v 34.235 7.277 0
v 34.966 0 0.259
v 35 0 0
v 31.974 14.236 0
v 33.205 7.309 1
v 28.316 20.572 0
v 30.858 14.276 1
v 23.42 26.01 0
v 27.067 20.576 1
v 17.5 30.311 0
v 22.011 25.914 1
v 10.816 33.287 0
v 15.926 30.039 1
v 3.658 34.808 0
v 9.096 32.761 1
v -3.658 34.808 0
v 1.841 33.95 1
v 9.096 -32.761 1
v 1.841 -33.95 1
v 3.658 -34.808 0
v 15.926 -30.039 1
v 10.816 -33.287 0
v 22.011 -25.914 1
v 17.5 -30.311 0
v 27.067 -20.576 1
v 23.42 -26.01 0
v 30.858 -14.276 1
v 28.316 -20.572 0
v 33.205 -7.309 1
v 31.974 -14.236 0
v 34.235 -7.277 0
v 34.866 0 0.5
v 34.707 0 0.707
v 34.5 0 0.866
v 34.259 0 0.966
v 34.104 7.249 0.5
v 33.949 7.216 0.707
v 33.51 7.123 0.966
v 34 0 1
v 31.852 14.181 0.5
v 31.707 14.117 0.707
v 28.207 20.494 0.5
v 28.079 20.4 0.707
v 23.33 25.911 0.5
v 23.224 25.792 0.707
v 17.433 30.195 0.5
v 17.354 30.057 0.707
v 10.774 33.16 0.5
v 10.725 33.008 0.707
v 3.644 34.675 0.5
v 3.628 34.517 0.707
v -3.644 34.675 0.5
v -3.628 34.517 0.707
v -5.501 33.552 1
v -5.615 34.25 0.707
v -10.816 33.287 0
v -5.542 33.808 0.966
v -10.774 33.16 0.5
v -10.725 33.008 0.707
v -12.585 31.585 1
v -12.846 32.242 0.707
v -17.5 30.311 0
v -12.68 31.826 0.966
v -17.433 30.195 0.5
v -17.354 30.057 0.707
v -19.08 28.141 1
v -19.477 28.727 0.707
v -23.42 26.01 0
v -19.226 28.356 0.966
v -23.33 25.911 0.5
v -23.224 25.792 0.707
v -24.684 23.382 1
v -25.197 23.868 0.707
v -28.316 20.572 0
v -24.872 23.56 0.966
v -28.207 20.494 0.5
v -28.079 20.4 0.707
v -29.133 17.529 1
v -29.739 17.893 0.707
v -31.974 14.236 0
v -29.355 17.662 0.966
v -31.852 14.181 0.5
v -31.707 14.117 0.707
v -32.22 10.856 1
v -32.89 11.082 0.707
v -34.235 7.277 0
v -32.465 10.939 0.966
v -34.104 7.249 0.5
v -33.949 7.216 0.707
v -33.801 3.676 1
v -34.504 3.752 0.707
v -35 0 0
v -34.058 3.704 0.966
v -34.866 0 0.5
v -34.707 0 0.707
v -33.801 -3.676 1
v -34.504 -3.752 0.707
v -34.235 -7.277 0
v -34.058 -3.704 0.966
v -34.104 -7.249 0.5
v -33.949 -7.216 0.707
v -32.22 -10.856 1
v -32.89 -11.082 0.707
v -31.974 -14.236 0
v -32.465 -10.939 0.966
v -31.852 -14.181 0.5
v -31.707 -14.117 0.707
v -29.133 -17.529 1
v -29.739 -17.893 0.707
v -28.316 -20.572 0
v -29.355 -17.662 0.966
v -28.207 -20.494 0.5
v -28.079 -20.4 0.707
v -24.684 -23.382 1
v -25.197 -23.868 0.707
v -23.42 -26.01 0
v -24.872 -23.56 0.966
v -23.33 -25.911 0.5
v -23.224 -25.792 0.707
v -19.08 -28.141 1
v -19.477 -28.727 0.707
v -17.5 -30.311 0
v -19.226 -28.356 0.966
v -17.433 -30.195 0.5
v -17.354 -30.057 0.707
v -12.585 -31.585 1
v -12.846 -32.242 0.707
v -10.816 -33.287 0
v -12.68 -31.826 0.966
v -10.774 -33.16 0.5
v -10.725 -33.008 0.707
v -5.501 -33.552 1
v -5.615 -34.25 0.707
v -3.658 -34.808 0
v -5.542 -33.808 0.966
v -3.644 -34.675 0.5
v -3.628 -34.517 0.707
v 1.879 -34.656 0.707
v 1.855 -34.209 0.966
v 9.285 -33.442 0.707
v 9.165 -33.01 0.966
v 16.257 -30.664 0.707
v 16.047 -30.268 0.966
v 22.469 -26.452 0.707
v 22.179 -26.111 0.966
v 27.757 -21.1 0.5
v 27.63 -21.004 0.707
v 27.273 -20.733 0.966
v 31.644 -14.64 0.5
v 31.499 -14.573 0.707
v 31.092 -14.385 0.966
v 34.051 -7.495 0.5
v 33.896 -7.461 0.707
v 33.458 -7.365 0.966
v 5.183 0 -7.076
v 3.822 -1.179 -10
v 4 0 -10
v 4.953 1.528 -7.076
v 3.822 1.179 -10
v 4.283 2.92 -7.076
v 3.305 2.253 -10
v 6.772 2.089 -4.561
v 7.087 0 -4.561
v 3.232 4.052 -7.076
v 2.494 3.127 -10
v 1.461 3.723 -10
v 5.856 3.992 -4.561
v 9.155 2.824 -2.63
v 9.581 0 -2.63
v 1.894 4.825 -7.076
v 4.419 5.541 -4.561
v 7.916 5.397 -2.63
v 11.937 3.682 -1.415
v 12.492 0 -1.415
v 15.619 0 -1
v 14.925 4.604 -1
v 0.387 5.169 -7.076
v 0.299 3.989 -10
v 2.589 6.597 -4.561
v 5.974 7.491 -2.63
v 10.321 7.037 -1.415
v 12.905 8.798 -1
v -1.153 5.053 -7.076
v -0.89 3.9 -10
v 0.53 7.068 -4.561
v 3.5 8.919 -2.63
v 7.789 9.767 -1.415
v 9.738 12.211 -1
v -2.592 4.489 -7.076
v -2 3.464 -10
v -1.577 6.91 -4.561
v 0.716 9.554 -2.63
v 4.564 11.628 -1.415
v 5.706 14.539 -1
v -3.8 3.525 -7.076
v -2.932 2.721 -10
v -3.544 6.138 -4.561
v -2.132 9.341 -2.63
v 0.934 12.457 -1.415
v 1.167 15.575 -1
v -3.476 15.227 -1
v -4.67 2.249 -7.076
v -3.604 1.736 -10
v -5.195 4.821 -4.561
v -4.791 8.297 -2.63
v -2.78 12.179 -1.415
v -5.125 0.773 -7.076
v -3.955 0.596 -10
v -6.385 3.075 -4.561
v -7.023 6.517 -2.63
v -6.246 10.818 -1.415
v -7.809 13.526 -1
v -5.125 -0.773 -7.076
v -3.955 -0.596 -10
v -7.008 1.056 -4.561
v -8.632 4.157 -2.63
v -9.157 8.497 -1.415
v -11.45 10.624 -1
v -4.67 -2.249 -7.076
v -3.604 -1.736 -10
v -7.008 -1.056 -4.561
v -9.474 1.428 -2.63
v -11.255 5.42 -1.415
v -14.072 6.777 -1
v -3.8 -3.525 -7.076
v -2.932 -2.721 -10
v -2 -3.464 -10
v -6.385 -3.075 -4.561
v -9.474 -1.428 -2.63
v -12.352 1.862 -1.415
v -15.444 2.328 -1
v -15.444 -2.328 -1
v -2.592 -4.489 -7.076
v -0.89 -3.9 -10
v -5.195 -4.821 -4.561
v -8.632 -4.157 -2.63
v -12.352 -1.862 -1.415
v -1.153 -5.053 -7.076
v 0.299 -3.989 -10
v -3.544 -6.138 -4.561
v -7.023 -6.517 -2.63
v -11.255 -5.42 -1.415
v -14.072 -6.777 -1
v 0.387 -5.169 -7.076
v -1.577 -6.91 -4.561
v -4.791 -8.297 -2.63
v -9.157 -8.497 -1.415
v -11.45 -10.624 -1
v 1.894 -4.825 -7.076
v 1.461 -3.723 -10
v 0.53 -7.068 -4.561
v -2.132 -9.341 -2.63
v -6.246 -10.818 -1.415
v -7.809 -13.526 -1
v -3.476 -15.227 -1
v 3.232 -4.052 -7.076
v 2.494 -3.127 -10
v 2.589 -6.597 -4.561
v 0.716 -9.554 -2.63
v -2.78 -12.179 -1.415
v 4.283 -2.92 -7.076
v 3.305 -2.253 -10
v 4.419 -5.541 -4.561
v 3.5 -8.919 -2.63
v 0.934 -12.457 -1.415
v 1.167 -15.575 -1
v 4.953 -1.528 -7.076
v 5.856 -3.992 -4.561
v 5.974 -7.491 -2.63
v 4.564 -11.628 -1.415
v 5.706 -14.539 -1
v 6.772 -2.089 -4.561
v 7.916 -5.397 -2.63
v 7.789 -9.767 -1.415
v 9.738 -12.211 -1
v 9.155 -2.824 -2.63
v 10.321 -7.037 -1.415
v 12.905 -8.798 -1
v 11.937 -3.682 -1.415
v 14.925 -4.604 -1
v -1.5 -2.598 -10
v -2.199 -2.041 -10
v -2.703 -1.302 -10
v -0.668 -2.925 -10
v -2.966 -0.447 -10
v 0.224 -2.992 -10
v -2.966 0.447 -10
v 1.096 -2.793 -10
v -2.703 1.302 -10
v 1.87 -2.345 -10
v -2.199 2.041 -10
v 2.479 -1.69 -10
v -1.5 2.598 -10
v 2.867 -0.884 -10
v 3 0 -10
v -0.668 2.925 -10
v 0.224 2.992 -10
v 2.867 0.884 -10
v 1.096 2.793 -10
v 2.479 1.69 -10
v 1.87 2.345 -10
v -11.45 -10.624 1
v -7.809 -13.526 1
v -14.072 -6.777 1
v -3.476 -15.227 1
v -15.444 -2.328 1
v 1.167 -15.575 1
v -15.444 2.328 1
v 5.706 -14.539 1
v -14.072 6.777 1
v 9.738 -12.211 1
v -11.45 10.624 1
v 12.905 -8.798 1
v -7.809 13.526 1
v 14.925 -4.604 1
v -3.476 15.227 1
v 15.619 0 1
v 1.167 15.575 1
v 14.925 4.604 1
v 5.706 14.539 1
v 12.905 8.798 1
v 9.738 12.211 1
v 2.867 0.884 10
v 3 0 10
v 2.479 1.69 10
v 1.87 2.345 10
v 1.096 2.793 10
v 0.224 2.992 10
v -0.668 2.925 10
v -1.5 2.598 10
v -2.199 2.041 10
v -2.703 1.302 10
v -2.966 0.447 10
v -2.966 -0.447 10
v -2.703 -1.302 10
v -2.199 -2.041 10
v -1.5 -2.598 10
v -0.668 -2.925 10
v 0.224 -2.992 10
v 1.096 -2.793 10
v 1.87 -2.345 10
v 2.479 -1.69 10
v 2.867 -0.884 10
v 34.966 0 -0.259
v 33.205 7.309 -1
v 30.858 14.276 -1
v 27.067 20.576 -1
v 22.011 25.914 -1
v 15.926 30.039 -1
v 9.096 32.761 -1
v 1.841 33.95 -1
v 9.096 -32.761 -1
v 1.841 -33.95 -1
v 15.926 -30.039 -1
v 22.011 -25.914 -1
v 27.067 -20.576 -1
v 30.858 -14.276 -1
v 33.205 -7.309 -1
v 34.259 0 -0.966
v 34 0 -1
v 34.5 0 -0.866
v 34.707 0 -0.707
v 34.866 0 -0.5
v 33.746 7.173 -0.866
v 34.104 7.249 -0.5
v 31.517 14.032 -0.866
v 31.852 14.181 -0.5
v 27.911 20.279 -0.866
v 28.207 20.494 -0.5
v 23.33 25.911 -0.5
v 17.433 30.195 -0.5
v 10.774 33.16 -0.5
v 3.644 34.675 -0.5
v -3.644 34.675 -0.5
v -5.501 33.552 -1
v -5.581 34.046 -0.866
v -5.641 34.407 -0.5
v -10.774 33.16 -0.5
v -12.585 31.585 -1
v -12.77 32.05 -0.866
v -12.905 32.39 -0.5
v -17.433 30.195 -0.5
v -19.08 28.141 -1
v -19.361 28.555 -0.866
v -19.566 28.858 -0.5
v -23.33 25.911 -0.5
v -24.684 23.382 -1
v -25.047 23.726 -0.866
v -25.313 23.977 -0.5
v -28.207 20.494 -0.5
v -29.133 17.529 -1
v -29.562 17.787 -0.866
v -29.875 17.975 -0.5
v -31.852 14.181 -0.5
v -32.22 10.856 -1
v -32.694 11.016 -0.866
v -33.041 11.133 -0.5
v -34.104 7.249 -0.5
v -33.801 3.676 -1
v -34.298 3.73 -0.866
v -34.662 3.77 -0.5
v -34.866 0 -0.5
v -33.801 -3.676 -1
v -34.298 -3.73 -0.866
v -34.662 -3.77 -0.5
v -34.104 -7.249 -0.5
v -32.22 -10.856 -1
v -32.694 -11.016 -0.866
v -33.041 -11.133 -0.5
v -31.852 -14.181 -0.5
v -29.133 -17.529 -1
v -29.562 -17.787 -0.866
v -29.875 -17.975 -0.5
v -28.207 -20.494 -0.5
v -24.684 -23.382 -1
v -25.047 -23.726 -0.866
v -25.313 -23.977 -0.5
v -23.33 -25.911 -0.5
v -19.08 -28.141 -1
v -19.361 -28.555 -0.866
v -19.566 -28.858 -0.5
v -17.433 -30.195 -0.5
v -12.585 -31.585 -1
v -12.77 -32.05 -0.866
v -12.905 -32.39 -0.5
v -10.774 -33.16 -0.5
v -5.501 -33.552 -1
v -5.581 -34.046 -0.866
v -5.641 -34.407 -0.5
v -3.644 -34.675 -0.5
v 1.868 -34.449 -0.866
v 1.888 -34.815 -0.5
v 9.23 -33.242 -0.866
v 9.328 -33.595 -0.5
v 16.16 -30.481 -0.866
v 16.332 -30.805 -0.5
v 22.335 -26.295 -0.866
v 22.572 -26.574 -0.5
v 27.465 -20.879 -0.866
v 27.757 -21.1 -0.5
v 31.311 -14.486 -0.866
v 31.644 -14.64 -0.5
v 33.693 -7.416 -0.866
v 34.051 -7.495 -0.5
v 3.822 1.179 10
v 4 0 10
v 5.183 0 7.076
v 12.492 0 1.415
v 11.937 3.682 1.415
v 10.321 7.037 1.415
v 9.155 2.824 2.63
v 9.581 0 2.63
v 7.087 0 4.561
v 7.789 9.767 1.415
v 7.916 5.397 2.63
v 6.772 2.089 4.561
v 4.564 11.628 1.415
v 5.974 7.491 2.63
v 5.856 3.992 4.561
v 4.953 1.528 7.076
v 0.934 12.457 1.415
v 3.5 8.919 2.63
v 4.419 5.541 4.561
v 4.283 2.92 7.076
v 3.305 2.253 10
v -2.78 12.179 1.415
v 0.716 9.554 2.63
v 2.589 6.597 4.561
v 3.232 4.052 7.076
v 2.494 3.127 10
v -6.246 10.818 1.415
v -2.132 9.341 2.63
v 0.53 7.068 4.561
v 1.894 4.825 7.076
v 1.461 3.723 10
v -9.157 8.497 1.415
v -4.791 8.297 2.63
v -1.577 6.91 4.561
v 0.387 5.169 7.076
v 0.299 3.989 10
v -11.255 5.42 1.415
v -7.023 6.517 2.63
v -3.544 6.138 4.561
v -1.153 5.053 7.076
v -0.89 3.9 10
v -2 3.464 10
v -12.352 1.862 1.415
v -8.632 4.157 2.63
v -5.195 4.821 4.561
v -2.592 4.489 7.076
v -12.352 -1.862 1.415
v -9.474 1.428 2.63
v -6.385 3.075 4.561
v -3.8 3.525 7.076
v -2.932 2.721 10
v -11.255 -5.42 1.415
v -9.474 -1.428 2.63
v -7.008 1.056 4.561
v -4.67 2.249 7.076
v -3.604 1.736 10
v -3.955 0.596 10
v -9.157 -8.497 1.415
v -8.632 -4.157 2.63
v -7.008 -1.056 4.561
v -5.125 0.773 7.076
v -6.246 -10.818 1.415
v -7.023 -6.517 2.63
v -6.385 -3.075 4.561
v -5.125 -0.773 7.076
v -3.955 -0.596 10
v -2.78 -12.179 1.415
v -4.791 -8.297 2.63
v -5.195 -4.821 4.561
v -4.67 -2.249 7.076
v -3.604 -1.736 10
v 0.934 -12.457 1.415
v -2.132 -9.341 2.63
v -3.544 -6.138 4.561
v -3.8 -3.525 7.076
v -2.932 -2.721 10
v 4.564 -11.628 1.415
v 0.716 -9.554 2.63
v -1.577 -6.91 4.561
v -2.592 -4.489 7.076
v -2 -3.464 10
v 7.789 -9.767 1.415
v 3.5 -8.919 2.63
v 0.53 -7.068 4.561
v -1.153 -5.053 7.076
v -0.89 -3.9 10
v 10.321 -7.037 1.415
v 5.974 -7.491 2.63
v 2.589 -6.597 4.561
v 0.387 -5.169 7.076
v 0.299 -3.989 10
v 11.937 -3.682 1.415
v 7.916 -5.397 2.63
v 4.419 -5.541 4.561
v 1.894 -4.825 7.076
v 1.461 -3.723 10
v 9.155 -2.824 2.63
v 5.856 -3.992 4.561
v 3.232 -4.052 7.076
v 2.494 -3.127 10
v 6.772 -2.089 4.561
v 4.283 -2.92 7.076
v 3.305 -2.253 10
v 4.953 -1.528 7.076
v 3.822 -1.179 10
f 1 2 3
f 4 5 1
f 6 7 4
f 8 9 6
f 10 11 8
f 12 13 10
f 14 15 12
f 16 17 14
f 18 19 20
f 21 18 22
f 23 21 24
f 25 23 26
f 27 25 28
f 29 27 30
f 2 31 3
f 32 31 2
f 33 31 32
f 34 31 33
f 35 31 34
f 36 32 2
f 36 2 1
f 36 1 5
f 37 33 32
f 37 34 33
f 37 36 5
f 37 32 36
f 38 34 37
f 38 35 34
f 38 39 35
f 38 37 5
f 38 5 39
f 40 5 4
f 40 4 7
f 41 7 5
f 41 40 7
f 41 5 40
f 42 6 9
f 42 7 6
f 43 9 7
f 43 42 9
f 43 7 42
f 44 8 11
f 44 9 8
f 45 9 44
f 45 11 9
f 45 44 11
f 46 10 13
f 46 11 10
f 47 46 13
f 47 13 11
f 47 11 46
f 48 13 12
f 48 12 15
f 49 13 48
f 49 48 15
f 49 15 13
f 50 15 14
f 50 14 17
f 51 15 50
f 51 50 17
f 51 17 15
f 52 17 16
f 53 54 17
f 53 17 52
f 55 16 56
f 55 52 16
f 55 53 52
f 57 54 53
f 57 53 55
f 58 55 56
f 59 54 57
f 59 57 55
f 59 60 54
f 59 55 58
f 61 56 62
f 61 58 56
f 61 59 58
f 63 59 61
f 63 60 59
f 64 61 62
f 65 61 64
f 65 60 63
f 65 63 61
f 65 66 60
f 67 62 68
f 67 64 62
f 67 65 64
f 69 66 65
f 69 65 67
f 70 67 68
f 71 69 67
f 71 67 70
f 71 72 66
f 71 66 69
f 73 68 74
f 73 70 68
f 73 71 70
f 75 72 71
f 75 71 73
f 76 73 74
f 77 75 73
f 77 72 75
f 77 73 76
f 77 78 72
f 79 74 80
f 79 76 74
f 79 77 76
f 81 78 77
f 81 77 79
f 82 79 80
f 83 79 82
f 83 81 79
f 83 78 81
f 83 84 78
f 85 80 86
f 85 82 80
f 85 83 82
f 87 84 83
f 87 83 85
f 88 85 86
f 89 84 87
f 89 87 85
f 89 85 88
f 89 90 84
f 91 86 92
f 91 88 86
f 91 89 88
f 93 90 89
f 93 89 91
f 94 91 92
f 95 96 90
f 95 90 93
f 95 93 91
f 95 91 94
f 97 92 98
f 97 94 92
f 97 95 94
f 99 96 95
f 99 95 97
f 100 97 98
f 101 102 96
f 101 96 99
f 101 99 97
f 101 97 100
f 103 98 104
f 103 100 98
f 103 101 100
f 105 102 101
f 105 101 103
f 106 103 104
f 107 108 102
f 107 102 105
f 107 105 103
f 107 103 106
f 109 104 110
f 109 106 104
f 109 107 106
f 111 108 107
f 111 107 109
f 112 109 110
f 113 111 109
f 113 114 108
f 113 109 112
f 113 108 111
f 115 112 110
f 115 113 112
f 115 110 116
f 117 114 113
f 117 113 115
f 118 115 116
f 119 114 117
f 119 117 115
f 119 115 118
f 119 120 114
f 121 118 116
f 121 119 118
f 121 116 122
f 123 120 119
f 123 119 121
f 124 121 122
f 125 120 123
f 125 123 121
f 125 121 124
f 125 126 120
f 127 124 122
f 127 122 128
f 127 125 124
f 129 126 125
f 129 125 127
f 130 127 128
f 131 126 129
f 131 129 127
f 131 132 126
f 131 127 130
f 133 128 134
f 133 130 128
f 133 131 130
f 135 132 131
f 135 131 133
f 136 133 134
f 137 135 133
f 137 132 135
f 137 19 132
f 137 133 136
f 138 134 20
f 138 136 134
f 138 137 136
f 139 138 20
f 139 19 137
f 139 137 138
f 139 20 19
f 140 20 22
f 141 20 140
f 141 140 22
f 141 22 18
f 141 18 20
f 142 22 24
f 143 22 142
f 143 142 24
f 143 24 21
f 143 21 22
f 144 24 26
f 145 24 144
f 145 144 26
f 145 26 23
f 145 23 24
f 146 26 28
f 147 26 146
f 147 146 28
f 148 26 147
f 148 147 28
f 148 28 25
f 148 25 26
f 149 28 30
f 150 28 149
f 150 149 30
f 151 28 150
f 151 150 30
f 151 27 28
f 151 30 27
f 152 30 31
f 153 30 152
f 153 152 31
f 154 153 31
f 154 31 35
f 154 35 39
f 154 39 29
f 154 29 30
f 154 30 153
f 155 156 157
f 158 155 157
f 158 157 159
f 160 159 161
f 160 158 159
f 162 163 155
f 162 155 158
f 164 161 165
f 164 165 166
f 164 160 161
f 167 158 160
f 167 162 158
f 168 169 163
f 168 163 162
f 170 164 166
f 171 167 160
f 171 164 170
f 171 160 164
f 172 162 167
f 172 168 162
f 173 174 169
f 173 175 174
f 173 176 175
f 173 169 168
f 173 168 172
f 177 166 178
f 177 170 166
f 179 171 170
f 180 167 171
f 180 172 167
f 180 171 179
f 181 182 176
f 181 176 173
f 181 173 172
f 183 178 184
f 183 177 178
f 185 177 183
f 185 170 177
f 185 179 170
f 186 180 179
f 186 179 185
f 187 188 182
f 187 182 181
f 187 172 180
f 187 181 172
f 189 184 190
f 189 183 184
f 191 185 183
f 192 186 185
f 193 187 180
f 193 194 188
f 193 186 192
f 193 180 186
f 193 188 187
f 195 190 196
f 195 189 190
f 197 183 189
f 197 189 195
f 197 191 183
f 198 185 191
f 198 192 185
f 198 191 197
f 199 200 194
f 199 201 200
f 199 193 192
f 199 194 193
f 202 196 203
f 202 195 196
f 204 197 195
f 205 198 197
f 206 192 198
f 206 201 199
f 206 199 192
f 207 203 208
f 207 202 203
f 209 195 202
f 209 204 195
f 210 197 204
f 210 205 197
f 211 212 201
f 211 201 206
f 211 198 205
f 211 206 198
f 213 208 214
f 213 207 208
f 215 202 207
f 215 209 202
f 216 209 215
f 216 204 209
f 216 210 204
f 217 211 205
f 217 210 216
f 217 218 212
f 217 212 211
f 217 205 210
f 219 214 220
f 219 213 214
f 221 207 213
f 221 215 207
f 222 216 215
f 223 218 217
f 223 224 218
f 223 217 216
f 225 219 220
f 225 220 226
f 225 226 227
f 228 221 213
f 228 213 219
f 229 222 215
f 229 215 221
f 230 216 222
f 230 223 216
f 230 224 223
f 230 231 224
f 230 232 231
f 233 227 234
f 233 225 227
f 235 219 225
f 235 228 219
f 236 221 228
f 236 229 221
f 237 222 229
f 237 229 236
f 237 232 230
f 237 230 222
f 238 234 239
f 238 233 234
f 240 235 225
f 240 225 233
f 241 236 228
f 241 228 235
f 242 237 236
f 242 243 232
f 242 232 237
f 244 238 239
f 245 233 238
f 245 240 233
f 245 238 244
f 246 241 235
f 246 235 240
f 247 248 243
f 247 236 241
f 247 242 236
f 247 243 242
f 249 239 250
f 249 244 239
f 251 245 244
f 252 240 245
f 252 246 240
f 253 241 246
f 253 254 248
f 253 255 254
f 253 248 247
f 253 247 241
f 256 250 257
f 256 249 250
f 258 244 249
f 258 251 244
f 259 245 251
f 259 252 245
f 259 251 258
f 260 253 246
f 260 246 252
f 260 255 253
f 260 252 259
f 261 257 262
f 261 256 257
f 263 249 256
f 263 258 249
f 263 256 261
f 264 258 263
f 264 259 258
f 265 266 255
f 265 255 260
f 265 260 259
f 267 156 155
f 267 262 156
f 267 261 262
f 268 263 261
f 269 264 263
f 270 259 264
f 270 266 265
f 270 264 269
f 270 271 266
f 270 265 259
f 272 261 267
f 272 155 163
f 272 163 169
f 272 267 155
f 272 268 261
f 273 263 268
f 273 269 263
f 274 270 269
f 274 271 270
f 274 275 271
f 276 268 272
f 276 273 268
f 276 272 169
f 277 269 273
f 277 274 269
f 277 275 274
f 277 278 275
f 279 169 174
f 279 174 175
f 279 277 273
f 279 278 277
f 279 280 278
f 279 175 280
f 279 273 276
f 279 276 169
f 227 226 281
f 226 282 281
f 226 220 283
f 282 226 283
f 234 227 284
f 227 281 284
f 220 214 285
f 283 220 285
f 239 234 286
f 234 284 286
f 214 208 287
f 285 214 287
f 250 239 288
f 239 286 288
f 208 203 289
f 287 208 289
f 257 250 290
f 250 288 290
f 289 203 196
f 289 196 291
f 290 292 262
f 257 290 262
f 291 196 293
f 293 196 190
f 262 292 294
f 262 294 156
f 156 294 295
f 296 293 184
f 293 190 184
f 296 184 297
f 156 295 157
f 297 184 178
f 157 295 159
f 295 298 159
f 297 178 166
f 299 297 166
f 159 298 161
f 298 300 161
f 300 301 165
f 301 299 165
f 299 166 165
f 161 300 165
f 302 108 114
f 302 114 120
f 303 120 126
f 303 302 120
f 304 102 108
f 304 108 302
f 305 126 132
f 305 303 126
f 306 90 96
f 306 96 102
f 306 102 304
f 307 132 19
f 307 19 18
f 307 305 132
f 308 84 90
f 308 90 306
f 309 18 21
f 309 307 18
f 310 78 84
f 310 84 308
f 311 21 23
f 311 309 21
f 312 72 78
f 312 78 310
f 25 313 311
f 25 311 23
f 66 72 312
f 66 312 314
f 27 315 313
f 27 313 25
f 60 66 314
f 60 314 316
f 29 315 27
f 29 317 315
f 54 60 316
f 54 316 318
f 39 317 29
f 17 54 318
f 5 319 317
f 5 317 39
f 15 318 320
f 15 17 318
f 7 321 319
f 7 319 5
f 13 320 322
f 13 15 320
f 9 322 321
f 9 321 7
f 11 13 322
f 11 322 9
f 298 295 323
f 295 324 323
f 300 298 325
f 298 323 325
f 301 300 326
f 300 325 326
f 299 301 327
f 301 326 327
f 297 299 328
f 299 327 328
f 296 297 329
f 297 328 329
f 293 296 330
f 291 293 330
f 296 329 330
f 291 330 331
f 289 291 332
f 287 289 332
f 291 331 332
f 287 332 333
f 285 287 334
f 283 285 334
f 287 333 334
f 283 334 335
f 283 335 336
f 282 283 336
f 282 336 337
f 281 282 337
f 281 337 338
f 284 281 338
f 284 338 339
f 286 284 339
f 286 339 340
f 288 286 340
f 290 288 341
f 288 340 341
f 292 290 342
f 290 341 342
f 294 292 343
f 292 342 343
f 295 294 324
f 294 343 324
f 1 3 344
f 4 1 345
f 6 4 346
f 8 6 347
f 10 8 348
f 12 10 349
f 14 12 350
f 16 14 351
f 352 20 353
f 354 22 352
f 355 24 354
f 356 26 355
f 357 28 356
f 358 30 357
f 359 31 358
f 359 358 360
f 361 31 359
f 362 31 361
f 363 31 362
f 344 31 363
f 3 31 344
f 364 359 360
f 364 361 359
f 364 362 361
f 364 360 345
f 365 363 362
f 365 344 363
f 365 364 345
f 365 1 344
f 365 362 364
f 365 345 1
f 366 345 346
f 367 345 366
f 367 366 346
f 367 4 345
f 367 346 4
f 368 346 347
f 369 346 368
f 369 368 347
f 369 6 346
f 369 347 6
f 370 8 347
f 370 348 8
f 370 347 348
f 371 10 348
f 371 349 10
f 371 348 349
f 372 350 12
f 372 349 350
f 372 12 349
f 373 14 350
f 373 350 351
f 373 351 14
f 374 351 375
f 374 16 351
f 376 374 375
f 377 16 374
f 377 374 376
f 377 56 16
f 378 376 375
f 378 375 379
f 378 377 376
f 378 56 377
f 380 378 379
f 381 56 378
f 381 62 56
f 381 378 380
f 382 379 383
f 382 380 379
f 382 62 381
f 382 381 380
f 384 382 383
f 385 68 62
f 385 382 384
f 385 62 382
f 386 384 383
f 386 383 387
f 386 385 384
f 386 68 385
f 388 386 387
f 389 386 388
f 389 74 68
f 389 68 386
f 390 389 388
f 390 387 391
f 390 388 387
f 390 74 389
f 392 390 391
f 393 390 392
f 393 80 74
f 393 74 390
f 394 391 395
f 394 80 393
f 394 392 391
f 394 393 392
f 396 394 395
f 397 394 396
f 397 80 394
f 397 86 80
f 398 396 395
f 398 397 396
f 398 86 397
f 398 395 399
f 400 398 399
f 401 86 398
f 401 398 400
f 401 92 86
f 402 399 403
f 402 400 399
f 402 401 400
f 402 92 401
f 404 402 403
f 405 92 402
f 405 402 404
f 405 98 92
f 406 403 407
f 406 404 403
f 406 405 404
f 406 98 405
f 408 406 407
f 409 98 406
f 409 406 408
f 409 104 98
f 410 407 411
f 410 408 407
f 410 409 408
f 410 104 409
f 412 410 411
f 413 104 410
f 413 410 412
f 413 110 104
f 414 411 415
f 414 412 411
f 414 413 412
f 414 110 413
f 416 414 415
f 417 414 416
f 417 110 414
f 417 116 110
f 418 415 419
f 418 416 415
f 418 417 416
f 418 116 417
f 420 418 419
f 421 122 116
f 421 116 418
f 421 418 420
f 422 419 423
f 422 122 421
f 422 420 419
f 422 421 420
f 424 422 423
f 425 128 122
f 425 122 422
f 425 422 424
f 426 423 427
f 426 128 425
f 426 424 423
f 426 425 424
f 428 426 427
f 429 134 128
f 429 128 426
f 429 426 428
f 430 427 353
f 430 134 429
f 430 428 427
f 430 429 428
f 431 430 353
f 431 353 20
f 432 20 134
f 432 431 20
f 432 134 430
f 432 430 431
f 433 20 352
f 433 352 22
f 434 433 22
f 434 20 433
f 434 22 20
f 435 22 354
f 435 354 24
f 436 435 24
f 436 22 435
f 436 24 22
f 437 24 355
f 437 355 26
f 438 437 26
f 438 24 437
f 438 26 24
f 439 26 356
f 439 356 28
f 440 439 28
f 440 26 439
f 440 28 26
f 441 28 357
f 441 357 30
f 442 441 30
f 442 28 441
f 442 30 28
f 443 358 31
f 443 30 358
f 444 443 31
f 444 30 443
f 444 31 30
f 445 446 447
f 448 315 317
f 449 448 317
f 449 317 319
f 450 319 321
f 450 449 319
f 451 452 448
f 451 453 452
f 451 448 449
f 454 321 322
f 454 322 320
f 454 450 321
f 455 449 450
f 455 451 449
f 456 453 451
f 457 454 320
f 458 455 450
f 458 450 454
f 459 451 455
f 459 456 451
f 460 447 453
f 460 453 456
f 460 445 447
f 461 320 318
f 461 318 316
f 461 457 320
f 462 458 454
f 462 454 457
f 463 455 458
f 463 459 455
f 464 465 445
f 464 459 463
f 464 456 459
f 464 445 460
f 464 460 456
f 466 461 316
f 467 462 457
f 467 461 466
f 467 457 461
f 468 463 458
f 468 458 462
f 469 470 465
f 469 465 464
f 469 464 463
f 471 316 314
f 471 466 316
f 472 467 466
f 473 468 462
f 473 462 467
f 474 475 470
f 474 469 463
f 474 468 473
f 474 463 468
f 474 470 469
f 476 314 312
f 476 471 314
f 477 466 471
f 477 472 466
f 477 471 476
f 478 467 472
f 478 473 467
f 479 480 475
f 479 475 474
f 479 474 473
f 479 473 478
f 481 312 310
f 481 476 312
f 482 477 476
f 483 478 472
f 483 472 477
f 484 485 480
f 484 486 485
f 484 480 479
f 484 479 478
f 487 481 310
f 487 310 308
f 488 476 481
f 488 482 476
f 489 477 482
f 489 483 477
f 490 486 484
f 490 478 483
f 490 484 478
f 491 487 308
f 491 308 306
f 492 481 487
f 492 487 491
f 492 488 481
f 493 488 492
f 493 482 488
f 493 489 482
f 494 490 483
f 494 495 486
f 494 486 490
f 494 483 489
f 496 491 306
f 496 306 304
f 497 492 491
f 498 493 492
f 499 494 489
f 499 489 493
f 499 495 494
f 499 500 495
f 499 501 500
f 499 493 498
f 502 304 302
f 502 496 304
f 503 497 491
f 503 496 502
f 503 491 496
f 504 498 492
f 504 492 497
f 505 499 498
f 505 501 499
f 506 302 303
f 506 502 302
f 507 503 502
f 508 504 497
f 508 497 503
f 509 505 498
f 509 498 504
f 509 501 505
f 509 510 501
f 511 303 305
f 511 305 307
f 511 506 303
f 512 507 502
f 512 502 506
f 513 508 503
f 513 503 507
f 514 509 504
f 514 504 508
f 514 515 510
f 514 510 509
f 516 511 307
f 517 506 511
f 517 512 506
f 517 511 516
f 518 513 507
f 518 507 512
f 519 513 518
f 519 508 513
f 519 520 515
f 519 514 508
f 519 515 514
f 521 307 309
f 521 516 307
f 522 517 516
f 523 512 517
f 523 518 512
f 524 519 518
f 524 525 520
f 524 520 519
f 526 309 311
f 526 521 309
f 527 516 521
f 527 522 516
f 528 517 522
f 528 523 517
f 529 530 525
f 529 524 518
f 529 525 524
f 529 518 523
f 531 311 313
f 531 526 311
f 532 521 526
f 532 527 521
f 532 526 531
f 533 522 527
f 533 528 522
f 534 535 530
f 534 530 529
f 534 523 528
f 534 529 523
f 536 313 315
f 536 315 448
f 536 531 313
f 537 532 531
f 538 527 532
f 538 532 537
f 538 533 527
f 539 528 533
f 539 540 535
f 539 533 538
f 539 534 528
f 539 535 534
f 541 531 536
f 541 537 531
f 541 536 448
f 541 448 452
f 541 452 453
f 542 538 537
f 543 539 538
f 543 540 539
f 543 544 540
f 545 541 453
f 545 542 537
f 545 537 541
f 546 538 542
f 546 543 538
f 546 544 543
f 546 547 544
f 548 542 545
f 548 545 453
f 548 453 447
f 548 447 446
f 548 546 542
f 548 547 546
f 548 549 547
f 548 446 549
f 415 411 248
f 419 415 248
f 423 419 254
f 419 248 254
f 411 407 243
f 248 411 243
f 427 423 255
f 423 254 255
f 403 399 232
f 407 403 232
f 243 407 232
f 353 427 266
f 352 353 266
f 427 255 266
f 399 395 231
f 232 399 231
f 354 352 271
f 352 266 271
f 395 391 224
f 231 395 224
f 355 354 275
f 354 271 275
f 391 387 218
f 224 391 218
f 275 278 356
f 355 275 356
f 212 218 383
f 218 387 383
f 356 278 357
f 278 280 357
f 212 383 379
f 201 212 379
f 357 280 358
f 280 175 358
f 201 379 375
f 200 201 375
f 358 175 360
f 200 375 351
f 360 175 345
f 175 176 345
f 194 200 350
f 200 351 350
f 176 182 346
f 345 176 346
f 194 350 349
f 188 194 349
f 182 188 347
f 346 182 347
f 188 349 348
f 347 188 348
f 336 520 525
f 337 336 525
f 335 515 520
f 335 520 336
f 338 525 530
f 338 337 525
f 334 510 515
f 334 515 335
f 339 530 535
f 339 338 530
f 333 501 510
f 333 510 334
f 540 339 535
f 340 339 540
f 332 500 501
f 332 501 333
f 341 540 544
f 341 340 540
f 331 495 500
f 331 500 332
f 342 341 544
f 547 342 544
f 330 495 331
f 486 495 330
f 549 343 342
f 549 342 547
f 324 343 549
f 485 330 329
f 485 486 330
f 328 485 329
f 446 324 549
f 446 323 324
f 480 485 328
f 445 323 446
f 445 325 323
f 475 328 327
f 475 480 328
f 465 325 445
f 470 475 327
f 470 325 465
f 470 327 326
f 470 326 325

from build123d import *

# Parameters (mm, degrees)
F0_R      = 4
F1_DEPTH  = 10
F2_R      = 35
F3_DEPTH  = 1
F6_R      = 0.99999
F7_R      = 3
F8_DEPTH  = 10.001
F9_R      = 3
F10_DEPTH = 10.001


# Not quite as in the source:
# - a fillet or chamfer that OpenCascade refuses, or shapes differently, is made with other operations: its cross-section is extruded or revolved along the edge and cut away or added
# - a fillet or chamfer is up to 0.001 mm smaller than in the source, because OpenCascade refuses the exact size


with BuildPart() as f1:
    # F0 (on Top) → F1 (new body, symmetric)
    with BuildSketch(Plane.XY):
        Circle(F0_R)
    extrude(amount=F1_DEPTH, both=True)

    # F2 (on Top) → F3 (join, symmetric)
    with BuildSketch(Plane.XY):
        Circle(F2_R)
    extrude(amount=F3_DEPTH, both=True)

    # F4: fillet of radius 12 on 1 edges, made by hand

    # F4_s1 → F4_t2 (revolve)
    with BuildSketch(Plane.XZ):
        with BuildLine():
            ThreePointArc((15.6189500386, 1), (8.2704808103, 3.5131670195), (4, 10))
            Line((4, 10), (4, 1))
            Line((4, 1), (15.6189500386, 1))
        make_face()
    revolve(axis=Axis((0, 0, 1), (0, 0, 1)))

    # F5: fillet of radius 12 on 1 edges, made by hand

    # F5_s1 → F5_t2 (revolve)
    with BuildSketch(Plane.XZ):
        with BuildLine():
            ThreePointArc((4, -10), (8.2704808103, -3.5131670195), (15.6189500386, -1))
            Line((15.6189500386, -1), (4, -1))
            Line((4, -1), (4, -10))
        make_face()
    revolve(axis=Axis((0, 0, -1), (0, 0, 1)))

    # F6 (radius 1 in the source; OpenCascade refuses exactly that, so slightly less here)
    f6_edges = [f1.edges().sort_by_distance(p)[0] for p in [
        (-35, 0, 1),
        (-35, 0, -1),
    ]]
    fillet(f6_edges, radius=F6_R)

    # F7 (on Top) → F8 (cut, through all)
    with BuildSketch(Plane.XY):
        Circle(F7_R)
    extrude(amount=-F8_DEPTH, mode=Mode.SUBTRACT)

    # F9 (on Top) → F10 (cut, through all)
    with BuildSketch(Plane.XY):
        Circle(F9_R)
    extrude(amount=F10_DEPTH, mode=Mode.SUBTRACT)


solid = f1.part
